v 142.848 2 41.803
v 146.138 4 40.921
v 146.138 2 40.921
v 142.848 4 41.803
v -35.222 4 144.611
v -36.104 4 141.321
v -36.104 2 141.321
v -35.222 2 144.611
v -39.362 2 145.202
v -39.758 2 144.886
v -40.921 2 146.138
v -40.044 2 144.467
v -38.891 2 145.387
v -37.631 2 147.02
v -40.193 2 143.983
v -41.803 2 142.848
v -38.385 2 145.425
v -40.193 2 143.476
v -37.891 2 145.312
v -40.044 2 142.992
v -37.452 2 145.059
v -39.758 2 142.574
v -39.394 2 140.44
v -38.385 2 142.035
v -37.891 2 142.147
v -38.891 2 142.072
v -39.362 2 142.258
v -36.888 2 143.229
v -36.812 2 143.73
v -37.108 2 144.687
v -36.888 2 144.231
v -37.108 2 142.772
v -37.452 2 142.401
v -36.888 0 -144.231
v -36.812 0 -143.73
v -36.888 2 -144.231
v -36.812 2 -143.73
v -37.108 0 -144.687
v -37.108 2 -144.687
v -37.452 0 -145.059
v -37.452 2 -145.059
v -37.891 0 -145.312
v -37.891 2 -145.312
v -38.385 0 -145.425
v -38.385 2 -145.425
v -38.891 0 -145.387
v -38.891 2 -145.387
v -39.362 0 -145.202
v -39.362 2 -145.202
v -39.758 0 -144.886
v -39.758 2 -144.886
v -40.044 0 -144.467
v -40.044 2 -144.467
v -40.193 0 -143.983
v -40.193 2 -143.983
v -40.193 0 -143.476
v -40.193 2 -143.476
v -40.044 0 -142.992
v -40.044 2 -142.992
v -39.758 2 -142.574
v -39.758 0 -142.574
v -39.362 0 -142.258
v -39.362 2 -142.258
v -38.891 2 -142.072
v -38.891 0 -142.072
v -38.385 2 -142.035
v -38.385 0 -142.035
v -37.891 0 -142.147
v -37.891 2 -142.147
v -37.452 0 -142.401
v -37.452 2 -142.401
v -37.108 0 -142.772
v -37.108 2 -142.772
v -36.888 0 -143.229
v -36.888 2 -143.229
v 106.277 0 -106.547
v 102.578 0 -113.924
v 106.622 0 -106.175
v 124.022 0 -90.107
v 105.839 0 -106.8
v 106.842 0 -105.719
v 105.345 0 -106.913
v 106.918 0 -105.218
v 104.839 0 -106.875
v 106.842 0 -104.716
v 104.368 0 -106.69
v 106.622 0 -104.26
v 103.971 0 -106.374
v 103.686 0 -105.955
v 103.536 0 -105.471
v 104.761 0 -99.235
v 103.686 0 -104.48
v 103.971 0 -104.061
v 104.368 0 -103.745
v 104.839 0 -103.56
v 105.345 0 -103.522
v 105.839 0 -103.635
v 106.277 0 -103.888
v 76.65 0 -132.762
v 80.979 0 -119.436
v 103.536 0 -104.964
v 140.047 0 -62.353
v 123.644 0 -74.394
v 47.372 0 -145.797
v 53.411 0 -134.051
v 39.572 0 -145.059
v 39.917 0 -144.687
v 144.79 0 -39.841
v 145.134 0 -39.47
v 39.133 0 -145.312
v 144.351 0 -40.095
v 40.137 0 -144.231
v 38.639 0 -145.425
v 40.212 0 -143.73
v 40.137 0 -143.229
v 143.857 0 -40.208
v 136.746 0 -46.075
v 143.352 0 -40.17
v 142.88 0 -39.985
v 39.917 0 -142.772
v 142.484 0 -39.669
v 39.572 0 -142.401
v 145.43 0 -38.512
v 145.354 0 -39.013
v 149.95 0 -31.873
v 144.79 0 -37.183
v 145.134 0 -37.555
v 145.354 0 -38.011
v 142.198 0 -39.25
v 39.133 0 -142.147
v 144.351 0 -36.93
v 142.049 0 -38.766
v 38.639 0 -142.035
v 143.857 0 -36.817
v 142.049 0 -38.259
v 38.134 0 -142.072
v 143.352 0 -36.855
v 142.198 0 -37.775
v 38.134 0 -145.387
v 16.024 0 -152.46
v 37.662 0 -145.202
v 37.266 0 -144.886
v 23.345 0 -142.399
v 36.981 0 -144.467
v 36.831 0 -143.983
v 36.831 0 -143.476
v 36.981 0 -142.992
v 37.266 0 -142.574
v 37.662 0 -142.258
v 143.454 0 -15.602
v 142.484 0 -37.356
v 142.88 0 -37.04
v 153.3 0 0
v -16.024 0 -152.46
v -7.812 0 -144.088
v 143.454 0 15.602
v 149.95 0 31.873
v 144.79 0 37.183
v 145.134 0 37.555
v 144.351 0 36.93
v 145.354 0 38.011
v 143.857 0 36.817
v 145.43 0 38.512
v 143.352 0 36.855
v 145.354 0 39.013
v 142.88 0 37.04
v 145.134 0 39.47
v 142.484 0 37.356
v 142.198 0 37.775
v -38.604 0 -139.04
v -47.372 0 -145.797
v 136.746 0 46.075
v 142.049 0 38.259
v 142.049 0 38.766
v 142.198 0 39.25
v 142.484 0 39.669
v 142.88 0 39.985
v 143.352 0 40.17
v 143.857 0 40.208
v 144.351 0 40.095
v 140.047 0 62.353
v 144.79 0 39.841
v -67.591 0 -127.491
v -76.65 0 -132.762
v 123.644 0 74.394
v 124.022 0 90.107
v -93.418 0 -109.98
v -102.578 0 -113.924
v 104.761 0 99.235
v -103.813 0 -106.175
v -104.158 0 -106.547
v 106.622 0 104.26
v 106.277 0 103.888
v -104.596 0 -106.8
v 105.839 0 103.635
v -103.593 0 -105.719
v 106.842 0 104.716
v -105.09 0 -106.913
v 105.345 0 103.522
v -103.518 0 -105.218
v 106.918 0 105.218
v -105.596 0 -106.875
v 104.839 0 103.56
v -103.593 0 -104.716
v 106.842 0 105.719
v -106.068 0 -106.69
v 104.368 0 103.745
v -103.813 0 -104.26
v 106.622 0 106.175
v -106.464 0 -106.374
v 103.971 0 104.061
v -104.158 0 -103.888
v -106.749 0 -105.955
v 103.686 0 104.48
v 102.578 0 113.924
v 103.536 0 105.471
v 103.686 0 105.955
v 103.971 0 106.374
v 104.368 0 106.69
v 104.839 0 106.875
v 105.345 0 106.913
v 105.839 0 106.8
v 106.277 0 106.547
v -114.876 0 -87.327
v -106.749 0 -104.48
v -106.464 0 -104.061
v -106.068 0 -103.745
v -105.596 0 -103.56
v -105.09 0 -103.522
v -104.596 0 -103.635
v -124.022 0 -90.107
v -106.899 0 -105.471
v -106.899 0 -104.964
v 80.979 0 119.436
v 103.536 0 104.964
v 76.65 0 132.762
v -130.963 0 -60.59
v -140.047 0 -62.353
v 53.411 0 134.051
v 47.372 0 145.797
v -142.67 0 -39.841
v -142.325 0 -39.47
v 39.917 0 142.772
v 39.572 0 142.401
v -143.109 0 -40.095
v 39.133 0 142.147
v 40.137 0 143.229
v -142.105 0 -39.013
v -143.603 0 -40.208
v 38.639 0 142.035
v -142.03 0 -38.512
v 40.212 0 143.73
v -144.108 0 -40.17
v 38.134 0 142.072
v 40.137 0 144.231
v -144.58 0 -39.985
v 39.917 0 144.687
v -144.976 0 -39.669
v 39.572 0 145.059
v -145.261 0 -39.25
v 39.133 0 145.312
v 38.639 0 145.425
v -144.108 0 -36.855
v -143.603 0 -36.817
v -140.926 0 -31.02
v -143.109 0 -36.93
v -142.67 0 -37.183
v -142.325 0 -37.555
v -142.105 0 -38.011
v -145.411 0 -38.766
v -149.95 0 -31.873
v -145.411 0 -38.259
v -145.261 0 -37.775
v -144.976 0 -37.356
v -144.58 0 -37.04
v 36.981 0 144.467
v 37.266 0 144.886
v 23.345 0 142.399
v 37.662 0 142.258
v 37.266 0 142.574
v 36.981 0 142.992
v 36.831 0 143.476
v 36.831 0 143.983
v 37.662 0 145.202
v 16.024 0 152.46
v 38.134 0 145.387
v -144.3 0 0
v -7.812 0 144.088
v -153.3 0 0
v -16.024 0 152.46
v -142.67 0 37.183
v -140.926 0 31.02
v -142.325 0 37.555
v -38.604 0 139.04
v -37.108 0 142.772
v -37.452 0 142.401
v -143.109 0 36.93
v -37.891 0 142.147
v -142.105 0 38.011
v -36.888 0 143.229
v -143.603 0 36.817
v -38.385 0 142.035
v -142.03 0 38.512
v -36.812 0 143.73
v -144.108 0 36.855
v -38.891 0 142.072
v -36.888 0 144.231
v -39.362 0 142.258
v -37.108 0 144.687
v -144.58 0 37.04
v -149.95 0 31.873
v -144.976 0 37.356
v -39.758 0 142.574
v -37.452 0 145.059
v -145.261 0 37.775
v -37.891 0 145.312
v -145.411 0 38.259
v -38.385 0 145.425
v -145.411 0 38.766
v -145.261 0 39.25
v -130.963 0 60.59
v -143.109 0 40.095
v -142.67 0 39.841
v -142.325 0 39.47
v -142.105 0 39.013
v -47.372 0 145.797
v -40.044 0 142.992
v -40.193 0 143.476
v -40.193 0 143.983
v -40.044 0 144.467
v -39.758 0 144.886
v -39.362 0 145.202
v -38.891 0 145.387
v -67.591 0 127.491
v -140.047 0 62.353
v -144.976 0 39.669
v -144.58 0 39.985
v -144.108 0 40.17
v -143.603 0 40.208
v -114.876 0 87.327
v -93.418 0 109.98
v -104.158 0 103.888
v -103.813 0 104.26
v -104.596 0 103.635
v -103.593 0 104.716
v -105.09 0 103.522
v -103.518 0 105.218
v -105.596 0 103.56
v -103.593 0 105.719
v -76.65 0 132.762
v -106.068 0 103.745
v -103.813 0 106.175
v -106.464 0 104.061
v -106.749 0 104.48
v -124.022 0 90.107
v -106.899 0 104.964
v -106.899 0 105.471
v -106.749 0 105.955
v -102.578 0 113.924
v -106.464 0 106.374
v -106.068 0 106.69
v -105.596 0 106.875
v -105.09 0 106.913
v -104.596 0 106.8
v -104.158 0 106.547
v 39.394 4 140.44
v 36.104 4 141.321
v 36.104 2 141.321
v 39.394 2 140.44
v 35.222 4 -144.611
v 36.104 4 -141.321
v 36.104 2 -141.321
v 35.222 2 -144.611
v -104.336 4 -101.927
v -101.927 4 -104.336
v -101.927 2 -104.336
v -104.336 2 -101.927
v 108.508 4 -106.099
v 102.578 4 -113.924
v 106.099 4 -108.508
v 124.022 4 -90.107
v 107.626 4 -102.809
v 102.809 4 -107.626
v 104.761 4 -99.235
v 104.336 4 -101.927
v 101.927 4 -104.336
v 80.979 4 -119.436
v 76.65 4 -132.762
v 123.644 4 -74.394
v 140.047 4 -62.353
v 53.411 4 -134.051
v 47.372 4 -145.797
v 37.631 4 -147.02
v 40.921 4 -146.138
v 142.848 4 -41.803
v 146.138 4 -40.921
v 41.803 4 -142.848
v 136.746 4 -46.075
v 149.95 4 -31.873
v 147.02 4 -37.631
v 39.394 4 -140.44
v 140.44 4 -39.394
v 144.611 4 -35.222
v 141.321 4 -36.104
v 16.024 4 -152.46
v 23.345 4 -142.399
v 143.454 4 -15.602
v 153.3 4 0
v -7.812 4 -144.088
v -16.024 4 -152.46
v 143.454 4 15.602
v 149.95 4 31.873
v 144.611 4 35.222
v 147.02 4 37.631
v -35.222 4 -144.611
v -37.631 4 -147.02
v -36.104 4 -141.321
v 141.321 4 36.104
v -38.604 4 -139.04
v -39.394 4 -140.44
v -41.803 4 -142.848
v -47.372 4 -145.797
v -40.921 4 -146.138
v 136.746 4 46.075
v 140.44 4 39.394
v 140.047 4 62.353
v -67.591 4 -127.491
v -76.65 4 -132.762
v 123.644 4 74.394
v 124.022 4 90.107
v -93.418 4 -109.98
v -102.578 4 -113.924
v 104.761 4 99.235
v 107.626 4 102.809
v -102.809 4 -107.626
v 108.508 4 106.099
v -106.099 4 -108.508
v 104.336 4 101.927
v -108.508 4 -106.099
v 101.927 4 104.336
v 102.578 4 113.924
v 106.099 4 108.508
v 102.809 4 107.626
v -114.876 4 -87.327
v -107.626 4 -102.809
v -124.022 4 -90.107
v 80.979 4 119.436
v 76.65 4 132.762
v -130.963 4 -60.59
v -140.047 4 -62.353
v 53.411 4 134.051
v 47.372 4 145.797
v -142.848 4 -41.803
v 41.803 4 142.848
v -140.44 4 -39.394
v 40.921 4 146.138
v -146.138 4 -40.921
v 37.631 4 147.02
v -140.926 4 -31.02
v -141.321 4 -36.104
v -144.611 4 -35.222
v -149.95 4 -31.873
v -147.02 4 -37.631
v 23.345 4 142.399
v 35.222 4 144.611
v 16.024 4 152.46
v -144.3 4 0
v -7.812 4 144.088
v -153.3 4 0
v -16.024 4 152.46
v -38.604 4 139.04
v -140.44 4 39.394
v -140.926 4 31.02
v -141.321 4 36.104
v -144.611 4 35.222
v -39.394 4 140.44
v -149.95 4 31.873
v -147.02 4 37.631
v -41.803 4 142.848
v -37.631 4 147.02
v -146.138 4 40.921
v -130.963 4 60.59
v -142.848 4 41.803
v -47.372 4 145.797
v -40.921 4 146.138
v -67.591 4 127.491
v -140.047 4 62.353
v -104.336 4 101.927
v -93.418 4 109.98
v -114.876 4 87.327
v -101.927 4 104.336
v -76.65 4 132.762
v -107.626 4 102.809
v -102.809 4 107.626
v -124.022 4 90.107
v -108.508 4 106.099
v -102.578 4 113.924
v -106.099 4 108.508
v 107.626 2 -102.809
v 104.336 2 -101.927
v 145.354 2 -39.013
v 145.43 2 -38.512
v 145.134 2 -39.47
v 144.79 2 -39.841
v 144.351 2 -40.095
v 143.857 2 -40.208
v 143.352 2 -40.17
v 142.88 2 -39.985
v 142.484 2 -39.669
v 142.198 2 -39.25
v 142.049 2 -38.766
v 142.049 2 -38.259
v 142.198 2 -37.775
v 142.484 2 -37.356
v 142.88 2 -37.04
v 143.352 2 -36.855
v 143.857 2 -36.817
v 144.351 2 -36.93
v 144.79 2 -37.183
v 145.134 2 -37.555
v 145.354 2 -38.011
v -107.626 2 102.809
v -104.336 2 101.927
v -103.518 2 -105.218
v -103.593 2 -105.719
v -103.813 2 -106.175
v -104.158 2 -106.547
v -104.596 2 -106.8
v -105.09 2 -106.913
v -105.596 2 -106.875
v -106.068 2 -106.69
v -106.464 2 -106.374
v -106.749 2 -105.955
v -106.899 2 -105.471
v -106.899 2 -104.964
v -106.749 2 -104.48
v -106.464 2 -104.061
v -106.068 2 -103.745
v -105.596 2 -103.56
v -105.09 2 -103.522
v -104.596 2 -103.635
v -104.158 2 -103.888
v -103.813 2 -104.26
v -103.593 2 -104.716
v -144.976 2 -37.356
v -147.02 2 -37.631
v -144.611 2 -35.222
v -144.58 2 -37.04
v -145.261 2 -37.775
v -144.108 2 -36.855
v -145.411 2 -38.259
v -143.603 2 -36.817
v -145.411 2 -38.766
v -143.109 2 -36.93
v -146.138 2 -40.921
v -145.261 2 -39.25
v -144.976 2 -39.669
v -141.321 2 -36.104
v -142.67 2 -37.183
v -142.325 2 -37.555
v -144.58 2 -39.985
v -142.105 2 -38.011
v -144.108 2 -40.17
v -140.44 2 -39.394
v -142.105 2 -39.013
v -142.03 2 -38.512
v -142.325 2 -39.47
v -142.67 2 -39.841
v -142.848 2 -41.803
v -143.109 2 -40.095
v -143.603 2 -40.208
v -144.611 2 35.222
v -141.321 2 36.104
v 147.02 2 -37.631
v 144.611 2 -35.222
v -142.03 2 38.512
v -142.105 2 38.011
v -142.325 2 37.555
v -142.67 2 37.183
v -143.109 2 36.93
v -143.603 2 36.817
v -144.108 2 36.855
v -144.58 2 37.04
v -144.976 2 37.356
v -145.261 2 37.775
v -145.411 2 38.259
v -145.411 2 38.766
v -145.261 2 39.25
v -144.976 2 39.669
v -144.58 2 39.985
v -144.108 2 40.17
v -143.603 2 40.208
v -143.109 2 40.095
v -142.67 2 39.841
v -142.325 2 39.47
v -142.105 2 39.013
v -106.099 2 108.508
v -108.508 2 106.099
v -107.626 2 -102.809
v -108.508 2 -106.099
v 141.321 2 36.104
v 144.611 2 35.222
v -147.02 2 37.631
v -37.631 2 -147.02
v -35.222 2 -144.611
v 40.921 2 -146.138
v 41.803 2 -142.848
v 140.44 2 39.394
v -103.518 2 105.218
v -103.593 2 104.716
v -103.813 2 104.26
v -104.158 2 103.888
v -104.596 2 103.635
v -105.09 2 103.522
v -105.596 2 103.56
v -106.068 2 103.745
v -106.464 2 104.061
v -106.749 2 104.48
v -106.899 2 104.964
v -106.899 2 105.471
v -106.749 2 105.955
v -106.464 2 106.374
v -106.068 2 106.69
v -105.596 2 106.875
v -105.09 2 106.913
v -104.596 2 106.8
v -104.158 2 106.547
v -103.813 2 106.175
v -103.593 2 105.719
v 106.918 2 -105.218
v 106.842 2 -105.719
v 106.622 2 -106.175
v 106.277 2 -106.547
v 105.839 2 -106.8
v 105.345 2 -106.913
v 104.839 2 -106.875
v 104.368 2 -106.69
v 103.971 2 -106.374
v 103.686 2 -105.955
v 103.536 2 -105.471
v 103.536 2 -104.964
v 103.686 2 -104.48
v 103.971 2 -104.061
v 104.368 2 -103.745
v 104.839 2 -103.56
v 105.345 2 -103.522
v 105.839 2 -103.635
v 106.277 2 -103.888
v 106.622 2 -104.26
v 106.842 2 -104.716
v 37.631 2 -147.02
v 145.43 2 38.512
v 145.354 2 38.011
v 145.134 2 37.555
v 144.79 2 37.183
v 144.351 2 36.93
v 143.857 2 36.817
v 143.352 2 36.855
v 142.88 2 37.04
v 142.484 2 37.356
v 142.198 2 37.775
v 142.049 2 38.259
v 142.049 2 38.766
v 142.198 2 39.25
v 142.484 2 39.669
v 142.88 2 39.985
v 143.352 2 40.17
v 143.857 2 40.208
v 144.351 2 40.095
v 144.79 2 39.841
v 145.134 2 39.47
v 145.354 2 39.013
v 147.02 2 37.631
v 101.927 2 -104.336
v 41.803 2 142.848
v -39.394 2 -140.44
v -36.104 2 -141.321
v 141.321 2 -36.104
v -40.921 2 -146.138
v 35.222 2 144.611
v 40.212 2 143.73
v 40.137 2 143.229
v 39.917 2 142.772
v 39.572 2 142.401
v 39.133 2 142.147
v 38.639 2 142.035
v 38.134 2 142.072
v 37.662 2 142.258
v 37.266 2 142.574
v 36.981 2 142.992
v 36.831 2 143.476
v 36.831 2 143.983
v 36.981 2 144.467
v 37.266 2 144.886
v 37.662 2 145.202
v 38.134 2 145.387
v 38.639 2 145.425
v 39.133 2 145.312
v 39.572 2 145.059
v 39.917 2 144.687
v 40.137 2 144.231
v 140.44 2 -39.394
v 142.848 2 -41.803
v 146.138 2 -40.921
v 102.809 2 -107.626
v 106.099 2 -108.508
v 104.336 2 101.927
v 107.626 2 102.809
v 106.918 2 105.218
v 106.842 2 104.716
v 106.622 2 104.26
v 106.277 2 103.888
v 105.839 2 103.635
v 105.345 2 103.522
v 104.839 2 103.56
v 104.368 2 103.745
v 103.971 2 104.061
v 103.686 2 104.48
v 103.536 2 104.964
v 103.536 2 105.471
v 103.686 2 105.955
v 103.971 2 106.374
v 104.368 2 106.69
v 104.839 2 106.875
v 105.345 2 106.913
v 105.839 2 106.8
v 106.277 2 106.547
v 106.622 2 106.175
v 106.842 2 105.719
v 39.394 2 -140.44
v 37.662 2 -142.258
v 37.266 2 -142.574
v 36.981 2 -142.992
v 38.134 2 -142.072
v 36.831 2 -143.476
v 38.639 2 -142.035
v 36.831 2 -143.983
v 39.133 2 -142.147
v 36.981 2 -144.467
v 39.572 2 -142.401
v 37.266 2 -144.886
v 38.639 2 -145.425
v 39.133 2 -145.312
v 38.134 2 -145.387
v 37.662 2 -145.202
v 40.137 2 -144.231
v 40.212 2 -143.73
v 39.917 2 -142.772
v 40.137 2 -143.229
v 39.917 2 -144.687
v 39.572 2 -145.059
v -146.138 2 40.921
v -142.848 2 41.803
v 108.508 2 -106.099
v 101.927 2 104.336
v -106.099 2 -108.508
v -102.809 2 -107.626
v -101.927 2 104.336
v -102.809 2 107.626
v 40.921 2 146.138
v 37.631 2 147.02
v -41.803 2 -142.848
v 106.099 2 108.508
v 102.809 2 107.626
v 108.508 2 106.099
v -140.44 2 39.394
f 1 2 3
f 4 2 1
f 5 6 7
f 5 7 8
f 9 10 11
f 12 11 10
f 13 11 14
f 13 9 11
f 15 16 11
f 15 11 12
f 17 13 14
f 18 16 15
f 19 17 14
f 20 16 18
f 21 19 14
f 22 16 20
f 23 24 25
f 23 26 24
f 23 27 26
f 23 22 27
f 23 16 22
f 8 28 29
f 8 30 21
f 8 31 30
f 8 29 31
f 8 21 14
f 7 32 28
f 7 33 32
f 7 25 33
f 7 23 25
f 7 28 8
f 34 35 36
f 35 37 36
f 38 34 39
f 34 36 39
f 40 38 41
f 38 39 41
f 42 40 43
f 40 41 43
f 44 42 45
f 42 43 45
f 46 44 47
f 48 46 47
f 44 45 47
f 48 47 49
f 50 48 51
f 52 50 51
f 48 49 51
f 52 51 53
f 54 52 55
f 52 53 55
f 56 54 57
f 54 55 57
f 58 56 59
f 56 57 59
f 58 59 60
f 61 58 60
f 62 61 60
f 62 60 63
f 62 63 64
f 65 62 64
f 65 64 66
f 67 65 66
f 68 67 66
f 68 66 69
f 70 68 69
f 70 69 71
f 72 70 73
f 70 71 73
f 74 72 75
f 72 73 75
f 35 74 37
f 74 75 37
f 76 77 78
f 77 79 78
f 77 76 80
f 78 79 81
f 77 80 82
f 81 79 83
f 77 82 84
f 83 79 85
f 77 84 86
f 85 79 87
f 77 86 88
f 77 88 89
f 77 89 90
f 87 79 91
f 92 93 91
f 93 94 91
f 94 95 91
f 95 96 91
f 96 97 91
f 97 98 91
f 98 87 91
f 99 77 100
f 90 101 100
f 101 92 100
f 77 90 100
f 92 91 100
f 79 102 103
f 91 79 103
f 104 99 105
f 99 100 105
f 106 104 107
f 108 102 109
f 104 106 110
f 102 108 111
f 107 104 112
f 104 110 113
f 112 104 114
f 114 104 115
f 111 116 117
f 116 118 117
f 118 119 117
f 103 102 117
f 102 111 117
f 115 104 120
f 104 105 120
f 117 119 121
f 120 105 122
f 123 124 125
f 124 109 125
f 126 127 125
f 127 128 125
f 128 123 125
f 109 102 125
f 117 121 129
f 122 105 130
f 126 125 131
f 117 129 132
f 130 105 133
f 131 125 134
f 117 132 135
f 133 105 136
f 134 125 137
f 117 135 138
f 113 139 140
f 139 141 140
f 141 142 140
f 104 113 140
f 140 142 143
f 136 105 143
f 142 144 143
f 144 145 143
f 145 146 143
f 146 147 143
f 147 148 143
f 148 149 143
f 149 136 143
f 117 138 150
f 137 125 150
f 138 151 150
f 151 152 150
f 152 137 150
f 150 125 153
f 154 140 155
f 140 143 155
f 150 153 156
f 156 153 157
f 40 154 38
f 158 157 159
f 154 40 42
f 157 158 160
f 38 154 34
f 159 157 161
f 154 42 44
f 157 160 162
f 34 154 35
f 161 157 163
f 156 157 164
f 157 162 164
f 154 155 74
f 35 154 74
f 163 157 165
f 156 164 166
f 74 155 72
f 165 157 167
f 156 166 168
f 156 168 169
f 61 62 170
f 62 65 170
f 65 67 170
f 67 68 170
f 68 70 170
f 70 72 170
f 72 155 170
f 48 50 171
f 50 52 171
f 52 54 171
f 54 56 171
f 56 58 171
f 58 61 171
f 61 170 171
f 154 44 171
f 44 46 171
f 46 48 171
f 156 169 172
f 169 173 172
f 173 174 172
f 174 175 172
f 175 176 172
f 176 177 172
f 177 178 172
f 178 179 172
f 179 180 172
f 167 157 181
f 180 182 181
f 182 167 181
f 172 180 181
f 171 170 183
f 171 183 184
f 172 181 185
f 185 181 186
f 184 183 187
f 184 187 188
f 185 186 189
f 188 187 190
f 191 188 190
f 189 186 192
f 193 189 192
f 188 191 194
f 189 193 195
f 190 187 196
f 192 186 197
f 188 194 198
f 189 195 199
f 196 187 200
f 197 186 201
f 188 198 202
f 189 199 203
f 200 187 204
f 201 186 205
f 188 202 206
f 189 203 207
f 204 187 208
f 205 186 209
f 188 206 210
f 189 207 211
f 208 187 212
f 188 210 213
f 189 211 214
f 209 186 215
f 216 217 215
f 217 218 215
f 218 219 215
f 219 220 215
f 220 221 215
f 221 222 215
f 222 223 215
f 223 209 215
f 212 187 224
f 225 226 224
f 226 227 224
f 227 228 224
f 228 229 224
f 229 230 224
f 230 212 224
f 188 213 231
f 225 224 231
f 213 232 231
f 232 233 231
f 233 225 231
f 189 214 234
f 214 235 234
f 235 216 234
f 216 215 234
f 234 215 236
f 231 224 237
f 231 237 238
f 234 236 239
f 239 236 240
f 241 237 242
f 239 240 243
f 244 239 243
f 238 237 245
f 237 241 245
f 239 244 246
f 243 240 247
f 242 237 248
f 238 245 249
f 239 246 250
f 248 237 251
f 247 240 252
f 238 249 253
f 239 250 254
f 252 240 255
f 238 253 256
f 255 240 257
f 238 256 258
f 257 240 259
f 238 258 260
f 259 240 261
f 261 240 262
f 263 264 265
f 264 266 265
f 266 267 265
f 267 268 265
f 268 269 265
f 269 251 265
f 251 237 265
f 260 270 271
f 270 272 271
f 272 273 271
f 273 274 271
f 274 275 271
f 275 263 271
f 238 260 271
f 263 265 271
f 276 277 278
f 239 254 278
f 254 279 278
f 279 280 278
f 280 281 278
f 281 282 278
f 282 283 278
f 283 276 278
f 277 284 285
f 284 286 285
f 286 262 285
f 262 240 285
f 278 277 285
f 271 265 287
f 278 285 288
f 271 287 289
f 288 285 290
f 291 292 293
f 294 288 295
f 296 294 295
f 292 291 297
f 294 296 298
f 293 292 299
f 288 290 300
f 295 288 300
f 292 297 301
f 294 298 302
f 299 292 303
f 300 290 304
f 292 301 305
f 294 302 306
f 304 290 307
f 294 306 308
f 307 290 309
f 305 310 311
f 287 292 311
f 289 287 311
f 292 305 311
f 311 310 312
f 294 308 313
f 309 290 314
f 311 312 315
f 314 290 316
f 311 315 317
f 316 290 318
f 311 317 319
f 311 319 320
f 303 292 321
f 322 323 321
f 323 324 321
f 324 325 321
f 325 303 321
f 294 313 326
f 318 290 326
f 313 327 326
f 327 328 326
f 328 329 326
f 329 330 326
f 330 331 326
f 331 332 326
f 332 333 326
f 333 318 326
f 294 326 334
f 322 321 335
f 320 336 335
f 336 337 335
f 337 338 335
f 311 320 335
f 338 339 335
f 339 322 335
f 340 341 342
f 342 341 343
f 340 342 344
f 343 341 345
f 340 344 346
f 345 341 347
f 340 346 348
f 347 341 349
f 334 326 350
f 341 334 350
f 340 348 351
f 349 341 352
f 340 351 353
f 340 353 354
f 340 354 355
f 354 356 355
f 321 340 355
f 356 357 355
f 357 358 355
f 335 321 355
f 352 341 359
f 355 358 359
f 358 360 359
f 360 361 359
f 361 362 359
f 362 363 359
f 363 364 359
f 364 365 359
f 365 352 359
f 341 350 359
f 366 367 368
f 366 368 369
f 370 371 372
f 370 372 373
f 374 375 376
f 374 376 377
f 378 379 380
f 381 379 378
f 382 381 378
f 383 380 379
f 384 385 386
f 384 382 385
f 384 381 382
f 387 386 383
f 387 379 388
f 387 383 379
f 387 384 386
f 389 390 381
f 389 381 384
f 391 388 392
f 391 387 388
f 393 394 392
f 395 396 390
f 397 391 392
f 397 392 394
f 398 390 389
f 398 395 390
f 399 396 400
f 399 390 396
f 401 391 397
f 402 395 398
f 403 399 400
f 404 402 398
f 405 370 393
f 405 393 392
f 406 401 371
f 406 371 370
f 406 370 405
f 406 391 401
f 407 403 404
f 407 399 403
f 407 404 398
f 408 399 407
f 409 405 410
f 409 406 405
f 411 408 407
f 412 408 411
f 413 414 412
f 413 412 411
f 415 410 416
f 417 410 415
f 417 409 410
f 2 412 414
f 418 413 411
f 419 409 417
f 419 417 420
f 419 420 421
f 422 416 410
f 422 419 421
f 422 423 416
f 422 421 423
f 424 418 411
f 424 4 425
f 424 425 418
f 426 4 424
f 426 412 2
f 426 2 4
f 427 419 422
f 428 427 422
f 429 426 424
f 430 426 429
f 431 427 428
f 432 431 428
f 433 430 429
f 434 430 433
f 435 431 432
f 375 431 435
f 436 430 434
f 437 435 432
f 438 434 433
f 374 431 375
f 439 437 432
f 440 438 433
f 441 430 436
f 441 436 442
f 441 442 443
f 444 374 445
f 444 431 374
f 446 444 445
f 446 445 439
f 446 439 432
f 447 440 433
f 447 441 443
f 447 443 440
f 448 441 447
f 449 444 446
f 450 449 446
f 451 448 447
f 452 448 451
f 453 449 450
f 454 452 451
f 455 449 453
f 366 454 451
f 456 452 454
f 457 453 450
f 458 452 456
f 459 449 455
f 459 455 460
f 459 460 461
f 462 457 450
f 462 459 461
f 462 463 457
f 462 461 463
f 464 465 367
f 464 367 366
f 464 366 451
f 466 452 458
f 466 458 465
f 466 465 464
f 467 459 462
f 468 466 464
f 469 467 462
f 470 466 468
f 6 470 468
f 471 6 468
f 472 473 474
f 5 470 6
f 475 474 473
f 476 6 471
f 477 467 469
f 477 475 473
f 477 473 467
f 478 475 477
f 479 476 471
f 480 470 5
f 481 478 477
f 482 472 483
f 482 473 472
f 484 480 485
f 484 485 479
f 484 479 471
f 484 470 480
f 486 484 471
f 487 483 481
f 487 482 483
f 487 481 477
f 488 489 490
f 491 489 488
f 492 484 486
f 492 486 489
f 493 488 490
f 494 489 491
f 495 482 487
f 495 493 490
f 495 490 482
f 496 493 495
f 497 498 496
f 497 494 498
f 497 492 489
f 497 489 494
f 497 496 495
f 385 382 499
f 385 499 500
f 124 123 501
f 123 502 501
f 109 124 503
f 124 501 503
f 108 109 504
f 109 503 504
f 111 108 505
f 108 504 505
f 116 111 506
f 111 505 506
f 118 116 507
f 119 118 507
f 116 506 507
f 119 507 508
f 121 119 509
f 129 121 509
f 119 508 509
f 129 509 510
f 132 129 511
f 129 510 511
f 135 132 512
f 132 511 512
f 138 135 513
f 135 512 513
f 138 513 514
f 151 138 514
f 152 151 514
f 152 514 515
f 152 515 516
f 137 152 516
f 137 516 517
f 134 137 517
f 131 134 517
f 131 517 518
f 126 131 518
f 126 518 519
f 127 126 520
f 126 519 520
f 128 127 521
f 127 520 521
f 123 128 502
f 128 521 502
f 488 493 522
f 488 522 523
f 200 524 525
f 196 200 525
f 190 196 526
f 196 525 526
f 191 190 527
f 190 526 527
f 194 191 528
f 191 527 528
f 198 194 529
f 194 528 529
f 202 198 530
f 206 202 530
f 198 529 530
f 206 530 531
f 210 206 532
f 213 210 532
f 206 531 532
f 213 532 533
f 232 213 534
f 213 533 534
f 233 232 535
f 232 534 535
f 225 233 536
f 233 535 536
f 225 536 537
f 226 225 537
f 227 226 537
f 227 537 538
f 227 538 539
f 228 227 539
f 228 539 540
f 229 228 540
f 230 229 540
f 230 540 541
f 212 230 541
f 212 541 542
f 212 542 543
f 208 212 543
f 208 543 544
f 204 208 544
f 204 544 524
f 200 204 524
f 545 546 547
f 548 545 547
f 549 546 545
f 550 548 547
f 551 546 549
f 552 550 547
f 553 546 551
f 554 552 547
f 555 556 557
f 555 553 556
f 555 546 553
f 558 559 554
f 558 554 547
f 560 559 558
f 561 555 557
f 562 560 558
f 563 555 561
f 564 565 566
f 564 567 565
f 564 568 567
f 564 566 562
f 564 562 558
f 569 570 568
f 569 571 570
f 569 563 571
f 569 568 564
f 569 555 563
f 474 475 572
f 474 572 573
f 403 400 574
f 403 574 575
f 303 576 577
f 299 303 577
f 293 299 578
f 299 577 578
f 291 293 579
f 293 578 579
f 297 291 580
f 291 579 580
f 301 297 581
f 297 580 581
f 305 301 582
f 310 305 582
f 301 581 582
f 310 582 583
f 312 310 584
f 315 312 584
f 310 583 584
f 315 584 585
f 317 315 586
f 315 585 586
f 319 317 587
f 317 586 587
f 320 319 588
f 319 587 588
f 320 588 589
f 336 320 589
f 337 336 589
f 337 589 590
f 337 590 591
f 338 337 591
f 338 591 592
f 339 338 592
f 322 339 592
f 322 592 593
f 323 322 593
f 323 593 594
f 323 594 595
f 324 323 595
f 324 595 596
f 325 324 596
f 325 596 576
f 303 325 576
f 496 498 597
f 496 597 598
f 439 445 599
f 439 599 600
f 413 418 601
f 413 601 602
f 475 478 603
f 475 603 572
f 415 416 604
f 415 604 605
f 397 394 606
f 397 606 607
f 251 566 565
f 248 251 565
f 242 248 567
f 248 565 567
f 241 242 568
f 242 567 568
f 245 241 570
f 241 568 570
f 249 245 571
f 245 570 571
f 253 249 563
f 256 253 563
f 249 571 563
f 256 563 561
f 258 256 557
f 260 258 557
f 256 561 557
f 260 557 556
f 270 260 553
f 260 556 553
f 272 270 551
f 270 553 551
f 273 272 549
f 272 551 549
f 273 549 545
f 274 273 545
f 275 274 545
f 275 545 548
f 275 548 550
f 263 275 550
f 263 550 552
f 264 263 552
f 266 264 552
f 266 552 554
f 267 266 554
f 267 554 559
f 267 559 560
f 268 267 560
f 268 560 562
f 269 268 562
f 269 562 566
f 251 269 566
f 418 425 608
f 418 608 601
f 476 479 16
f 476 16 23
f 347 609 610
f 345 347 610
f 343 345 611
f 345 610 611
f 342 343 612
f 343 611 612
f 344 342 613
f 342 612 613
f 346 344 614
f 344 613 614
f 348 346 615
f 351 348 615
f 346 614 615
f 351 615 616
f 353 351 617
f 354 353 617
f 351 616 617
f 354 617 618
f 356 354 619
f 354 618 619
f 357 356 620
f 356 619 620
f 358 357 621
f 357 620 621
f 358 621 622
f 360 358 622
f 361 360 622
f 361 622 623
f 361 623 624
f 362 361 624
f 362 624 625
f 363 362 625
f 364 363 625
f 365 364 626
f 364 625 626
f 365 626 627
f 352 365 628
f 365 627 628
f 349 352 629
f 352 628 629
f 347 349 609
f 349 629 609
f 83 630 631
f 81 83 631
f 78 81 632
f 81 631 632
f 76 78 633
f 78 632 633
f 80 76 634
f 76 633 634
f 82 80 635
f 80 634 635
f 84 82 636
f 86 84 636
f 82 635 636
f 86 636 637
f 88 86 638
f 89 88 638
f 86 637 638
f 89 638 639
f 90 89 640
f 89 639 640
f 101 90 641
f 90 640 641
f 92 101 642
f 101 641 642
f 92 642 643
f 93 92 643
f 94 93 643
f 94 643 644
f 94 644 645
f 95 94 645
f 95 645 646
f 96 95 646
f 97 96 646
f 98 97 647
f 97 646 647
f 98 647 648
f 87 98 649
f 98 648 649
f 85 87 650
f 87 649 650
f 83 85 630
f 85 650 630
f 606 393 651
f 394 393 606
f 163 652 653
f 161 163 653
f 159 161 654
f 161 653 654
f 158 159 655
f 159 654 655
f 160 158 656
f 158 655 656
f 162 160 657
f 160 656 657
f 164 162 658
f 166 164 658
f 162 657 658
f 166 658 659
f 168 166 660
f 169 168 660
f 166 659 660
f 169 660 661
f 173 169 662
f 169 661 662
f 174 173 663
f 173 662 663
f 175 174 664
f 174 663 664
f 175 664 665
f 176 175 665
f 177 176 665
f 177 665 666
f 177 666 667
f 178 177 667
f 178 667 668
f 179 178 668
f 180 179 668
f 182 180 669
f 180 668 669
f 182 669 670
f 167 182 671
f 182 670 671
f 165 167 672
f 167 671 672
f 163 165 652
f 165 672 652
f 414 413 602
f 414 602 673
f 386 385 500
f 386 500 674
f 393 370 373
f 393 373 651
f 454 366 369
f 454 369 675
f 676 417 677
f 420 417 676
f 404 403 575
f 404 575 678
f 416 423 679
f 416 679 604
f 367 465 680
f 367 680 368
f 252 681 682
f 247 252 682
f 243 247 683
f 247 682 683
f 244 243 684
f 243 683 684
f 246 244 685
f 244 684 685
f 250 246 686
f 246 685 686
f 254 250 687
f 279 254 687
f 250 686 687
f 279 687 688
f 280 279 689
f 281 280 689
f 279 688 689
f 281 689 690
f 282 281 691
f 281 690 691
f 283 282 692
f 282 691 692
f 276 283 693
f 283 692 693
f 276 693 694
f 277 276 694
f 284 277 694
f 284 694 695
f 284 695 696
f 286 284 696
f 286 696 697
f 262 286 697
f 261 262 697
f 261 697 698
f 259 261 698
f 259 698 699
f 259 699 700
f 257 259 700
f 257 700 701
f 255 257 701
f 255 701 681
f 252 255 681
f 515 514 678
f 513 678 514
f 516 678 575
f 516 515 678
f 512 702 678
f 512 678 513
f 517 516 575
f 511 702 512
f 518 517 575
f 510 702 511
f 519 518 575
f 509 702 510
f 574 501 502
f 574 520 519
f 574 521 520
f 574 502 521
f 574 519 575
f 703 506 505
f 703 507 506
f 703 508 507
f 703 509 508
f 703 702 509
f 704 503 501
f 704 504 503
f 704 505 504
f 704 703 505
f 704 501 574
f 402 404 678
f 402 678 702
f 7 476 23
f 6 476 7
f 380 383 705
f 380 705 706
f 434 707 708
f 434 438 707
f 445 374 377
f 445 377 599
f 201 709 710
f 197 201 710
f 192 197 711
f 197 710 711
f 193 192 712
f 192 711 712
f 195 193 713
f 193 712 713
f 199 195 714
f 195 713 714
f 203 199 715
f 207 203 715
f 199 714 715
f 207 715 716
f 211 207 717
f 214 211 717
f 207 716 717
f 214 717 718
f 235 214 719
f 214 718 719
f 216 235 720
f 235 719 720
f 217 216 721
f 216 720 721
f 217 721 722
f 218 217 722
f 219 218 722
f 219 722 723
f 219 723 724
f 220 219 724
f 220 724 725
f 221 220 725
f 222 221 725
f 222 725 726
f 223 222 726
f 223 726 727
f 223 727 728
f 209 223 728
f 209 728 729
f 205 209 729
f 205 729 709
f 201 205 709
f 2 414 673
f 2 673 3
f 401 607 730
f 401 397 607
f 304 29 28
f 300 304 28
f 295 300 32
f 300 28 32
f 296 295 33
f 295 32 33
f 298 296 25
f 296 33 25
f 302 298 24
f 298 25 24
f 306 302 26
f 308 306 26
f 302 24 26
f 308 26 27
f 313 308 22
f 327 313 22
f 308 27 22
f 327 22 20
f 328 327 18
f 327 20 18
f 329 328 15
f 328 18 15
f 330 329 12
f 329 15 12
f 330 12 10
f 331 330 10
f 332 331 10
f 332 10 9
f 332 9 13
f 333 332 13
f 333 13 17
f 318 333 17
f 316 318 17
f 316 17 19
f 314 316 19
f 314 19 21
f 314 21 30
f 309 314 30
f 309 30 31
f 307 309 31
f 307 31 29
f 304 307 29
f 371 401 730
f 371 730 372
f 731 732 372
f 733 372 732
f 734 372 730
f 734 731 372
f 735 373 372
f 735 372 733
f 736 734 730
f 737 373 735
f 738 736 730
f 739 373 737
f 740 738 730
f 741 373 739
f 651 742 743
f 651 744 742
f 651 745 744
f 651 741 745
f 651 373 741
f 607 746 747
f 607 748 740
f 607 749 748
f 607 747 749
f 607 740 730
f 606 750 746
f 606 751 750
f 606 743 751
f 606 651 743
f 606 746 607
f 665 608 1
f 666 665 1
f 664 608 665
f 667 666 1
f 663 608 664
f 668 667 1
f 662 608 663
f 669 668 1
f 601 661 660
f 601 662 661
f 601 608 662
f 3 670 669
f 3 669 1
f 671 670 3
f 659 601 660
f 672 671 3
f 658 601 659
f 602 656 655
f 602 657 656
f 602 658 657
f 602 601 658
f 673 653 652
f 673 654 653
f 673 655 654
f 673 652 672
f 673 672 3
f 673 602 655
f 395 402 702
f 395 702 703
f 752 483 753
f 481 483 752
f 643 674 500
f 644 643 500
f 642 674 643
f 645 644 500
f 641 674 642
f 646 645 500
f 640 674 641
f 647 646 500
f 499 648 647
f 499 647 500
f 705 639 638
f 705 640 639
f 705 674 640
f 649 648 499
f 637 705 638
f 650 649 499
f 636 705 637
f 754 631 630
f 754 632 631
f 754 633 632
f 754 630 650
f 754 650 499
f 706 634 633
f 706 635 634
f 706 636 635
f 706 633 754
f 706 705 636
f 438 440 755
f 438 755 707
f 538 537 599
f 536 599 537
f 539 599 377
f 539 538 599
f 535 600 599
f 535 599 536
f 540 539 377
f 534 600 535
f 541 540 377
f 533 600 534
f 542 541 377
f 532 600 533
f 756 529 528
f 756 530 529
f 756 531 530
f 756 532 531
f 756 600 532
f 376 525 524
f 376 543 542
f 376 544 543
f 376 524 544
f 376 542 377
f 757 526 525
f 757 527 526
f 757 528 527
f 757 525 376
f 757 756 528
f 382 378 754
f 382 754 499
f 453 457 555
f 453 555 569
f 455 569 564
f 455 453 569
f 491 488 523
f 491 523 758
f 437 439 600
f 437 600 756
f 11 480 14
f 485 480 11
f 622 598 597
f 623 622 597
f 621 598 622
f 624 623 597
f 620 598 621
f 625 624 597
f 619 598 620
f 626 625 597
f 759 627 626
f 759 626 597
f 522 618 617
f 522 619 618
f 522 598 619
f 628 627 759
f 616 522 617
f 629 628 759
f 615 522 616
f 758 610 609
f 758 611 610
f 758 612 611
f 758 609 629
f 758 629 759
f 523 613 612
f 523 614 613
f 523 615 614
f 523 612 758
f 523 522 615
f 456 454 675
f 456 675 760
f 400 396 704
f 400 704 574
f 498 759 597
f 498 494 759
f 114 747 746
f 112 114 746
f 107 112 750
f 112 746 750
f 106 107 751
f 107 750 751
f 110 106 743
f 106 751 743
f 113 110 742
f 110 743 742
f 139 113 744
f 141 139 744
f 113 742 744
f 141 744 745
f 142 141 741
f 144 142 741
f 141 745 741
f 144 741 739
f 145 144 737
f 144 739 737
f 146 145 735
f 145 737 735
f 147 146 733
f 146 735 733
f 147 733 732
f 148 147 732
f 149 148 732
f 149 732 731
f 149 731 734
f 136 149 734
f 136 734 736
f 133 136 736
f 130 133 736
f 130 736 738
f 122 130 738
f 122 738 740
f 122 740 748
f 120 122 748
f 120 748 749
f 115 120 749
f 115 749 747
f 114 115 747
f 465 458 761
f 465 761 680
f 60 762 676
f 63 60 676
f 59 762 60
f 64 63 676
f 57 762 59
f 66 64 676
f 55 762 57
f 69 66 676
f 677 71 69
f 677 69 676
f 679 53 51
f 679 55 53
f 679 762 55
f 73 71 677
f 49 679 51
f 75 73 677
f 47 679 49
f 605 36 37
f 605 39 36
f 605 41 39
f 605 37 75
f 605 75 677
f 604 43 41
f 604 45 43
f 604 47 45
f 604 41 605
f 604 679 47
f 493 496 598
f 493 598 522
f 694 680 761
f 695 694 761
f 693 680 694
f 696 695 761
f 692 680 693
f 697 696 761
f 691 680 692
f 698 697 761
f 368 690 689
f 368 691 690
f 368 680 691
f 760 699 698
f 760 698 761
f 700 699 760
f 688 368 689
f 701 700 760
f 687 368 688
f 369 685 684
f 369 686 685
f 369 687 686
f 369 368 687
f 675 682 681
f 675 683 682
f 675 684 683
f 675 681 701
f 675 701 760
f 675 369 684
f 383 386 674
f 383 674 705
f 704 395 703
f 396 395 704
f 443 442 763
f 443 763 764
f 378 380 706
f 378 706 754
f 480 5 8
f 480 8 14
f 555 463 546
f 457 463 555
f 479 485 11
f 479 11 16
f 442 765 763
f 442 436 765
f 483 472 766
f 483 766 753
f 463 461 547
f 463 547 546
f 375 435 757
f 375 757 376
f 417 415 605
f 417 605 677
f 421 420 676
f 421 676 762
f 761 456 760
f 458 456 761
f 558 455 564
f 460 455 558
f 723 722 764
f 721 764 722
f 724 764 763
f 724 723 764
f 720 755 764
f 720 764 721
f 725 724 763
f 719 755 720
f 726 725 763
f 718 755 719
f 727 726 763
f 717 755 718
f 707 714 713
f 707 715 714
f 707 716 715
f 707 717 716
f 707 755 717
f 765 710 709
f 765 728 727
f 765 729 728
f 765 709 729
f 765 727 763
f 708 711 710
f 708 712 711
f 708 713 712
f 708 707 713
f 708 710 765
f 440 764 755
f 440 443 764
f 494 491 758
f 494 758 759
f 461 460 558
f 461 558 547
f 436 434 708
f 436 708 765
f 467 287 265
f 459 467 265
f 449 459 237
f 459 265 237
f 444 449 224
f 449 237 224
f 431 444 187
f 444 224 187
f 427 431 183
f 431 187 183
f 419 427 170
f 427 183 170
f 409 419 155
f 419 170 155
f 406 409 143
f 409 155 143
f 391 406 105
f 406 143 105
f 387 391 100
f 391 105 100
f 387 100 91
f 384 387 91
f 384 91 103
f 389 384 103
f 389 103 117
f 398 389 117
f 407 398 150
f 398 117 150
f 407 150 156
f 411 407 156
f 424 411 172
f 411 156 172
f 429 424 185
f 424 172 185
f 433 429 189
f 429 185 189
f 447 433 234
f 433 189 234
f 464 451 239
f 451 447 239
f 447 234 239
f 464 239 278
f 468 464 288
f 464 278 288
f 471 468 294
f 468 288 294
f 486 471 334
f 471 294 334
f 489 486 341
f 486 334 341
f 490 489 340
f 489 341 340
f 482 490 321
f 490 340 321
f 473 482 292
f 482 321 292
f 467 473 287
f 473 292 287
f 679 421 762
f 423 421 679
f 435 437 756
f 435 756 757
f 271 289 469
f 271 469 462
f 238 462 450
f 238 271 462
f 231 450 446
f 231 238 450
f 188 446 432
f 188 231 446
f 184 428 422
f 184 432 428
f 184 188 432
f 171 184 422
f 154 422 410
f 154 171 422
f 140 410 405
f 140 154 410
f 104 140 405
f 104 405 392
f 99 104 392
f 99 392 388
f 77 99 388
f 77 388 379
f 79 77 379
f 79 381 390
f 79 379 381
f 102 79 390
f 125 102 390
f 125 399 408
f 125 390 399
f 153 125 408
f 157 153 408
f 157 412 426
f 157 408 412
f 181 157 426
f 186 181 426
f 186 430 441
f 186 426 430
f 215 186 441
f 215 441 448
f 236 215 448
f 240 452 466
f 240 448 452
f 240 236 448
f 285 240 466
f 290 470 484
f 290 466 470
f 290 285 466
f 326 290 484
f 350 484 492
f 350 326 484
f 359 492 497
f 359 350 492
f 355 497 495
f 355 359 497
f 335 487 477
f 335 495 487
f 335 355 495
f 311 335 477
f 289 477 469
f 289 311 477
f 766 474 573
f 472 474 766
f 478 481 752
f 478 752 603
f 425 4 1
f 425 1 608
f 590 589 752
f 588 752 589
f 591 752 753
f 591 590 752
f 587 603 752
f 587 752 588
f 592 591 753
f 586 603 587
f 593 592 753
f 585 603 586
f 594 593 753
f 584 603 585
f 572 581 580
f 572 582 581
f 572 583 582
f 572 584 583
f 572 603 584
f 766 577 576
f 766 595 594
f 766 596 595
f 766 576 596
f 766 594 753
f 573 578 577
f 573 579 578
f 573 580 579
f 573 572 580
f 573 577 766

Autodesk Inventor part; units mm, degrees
ref_plane "YZ Plane" through (0, 0, 0) normal (1, 0, 0) x (0, 1, 0)
ref_plane "XZ Plane" through (0, 0, 0) normal (0, 1, 0) x (-1, 0, 0)
ref_plane "XY Plane" through (0, 0, 0) normal (0, 0, 1) x (1, 0, 0)
sketch "Sketch1" plane through (0, 0, 0) normal (0, 1, 0) x (-1, 0, 0)
  circle A0 centre (0, 0) radius 144.3
  circle A1 centre (0, 0) radius 153.3
  dimension "d1" = 9
  dimension "d5" = 306.6
extrude "Extrusion1" add sketch "Sketch1" along normal blind 4
sketch "Sketch2" plane through (0, 4, 0) normal (0, 1, 0) x (1, 0, 0)
  line L0 (0, 0) -> (143.7298, 38.5123) construction
  line L1 (146.1384, 40.9209) -> (147.0201, 37.6306)
  line L2 (147.0201, 37.6306) -> (144.6114, 35.222)
  line L3 (144.6114, 35.222) -> (141.3211, 36.1036)
  line L4 (141.3211, 36.1036) -> (140.4395, 39.3939)
  line L5 (140.4395, 39.3939) -> (142.8481, 41.8026)
  line L6 (142.8481, 41.8026) -> (146.1384, 40.9209)
  line L7 (0, 0) -> (153.3, 0) construction
  circle A0 centre (0, 0) radius 153.3 projected
  line L8 (102.8088, 107.6262) -> (106.0991, 108.5078)
  line L9 (101.9272, 104.3359) -> (102.8088, 107.6262)
  line L10 (104.3359, 101.9272) -> (101.9272, 104.3359)
  line L11 (107.6262, 102.8088) -> (104.3359, 101.9272)
  line L12 (108.5078, 106.0991) -> (107.6262, 102.8088)
  line L13 (106.0991, 108.5078) -> (108.5078, 106.0991)
  line L14 (35.222, 144.6114) -> (37.6306, 147.0201)
  line L15 (36.1036, 141.3211) -> (35.222, 144.6114)
  line L16 (39.3939, 140.4395) -> (36.1036, 141.3211)
  line L17 (41.8026, 142.8481) -> (39.3939, 140.4395)
  line L18 (40.9209, 146.1384) -> (41.8026, 142.8481)
  line L19 (37.6306, 147.0201) -> (40.9209, 146.1384)
  line L20 (-41.8026, 142.8481) -> (-40.9209, 146.1384)
  line L21 (-39.3939, 140.4395) -> (-41.8026, 142.8481)
  line L22 (-36.1036, 141.3211) -> (-39.3939, 140.4395)
  line L23 (-35.222, 144.6114) -> (-36.1036, 141.3211)
  line L24 (-37.6306, 147.0201) -> (-35.222, 144.6114)
  line L25 (-40.9209, 146.1384) -> (-37.6306, 147.0201)
  line L26 (-107.6262, 102.8088) -> (-108.5078, 106.0991)
  line L27 (-104.3359, 101.9272) -> (-107.6262, 102.8088)
  line L28 (-101.9272, 104.3359) -> (-104.3359, 101.9272)
  line L29 (-102.8088, 107.6262) -> (-101.9272, 104.3359)
  line L30 (-106.0991, 108.5078) -> (-102.8088, 107.6262)
  line L31 (-108.5078, 106.0991) -> (-106.0991, 108.5078)
  line L32 (-144.6114, 35.222) -> (-147.0201, 37.6306)
  line L33 (-141.3211, 36.1036) -> (-144.6114, 35.222)
  line L34 (-140.4395, 39.3939) -> (-141.3211, 36.1036)
  line L35 (-142.8481, 41.8026) -> (-140.4395, 39.3939)
  line L36 (-146.1384, 40.9209) -> (-142.8481, 41.8026)
  line L37 (-147.0201, 37.6306) -> (-146.1384, 40.9209)
  line L38 (-142.8481, -41.8026) -> (-146.1384, -40.9209)
  line L39 (-140.4395, -39.3939) -> (-142.8481, -41.8026)
  line L40 (-141.3211, -36.1036) -> (-140.4395, -39.3939)
  line L41 (-144.6114, -35.222) -> (-141.3211, -36.1036)
  line L42 (-147.0201, -37.6306) -> (-144.6114, -35.222)
  line L43 (-146.1384, -40.9209) -> (-147.0201, -37.6306)
  line L44 (-102.8088, -107.6262) -> (-106.0991, -108.5078)
  line L45 (-101.9272, -104.3359) -> (-102.8088, -107.6262)
  line L46 (-104.3359, -101.9272) -> (-101.9272, -104.3359)
  line L47 (-107.6262, -102.8088) -> (-104.3359, -101.9272)
  line L48 (-108.5078, -106.0991) -> (-107.6262, -102.8088)
  line L49 (-106.0991, -108.5078) -> (-108.5078, -106.0991)
  line L50 (-35.222, -144.6114) -> (-37.6306, -147.0201)
  line L51 (-36.1036, -141.3211) -> (-35.222, -144.6114)
  line L52 (-39.3939, -140.4395) -> (-36.1036, -141.3211)
  line L53 (-41.8026, -142.8481) -> (-39.3939, -140.4395)
  line L54 (-40.9209, -146.1384) -> (-41.8026, -142.8481)
  line L55 (-37.6306, -147.0201) -> (-40.9209, -146.1384)
  line L56 (41.8026, -142.8481) -> (40.9209, -146.1384)
  line L57 (39.3939, -140.4395) -> (41.8026, -142.8481)
  line L58 (36.1036, -141.3211) -> (39.3939, -140.4395)
  line L59 (35.222, -144.6114) -> (36.1036, -141.3211)
  line L60 (37.6306, -147.0201) -> (35.222, -144.6114)
  line L61 (40.9209, -146.1384) -> (37.6306, -147.0201)
  line L62 (107.6262, -102.8088) -> (108.5078, -106.0991)
  line L63 (104.3359, -101.9272) -> (107.6262, -102.8088)
  line L64 (101.9272, -104.3359) -> (104.3359, -101.9272)
  line L65 (102.8088, -107.6262) -> (101.9272, -104.3359)
  line L66 (106.0991, -108.5078) -> (102.8088, -107.6262)
  line L67 (108.5078, -106.0991) -> (106.0991, -108.5078)
  line L68 (144.6114, -35.222) -> (147.0201, -37.6306)
  line L69 (141.3211, -36.1036) -> (144.6114, -35.222)
  line L70 (140.4395, -39.3939) -> (141.3211, -36.1036)
  line L71 (142.8481, -41.8026) -> (140.4395, -39.3939)
  line L72 (146.1384, -40.9209) -> (142.8481, -41.8026)
  line L73 (147.0201, -37.6306) -> (146.1384, -40.9209)
  dimension "d6" = 148.8
  dimension "d7" = 5.9
  dimension "d8" = 15
  dimension "d11" = 360
extrude "Extrusion2" cut sketch "Sketch2" against normal blind 2 contours L1 L2 L3 L4 L5 L6 | L8 L13 L12 L11 L10 L9 | L14 L19 L18 L17 L16 L15 | L20 L25 L24 L23 L22 L21 | L26 L31 L30 L29 L28 L27 | L32 L37 L36 L35 L34 L33 | L38 L43 L42 L41 L40 L39 | L44 L49 L48 L47 L46 L45 | L50 L55 L54 L53 L52 L51 | L56 L61 L60 L59 L58 L57 | L62 L67 L66 L65 L64 L63 | L68 L73 L72 L71 L70 L69
sketch "Sketch3" plane through (0, 2, 0) normal (0, 1, 0) x (1, 0, 0)
  circle A0 centre (143.7298, 38.5123) radius 1.7
  line L0 (144.6114, 35.222) -> (141.3211, 36.1036) projected
  line L1 (142.8481, 41.8026) -> (146.1384, 40.9209) projected
  line L2 (144.6114, 35.222) -> (142.8481, 41.8026) construction
  circle A1 centre (105.2175, 105.2175) radius 1.7
  circle A2 centre (38.5123, 143.7298) radius 1.7
  circle A3 centre (-38.5123, 143.7298) radius 1.7
  circle A4 centre (-105.2175, 105.2175) radius 1.7
  circle A5 centre (-143.7298, 38.5123) radius 1.7
  circle A6 centre (-143.7298, -38.5123) radius 1.7
  circle A7 centre (-105.2175, -105.2175) radius 1.7
  circle A8 centre (-38.5123, -143.7298) radius 1.7
  circle A9 centre (38.5123, -143.7298) radius 1.7
  circle A10 centre (105.2175, -105.2175) radius 1.7
  circle A11 centre (143.7298, -38.5123) radius 1.7
  point P0 (0, 0)
  dimension "d15" = 3.4
  dimension "d18" = 360
extrude "Extrusion3" cut sketch "Sketch3" against normal through all
properties part number "ArmLoopOuterRing"
